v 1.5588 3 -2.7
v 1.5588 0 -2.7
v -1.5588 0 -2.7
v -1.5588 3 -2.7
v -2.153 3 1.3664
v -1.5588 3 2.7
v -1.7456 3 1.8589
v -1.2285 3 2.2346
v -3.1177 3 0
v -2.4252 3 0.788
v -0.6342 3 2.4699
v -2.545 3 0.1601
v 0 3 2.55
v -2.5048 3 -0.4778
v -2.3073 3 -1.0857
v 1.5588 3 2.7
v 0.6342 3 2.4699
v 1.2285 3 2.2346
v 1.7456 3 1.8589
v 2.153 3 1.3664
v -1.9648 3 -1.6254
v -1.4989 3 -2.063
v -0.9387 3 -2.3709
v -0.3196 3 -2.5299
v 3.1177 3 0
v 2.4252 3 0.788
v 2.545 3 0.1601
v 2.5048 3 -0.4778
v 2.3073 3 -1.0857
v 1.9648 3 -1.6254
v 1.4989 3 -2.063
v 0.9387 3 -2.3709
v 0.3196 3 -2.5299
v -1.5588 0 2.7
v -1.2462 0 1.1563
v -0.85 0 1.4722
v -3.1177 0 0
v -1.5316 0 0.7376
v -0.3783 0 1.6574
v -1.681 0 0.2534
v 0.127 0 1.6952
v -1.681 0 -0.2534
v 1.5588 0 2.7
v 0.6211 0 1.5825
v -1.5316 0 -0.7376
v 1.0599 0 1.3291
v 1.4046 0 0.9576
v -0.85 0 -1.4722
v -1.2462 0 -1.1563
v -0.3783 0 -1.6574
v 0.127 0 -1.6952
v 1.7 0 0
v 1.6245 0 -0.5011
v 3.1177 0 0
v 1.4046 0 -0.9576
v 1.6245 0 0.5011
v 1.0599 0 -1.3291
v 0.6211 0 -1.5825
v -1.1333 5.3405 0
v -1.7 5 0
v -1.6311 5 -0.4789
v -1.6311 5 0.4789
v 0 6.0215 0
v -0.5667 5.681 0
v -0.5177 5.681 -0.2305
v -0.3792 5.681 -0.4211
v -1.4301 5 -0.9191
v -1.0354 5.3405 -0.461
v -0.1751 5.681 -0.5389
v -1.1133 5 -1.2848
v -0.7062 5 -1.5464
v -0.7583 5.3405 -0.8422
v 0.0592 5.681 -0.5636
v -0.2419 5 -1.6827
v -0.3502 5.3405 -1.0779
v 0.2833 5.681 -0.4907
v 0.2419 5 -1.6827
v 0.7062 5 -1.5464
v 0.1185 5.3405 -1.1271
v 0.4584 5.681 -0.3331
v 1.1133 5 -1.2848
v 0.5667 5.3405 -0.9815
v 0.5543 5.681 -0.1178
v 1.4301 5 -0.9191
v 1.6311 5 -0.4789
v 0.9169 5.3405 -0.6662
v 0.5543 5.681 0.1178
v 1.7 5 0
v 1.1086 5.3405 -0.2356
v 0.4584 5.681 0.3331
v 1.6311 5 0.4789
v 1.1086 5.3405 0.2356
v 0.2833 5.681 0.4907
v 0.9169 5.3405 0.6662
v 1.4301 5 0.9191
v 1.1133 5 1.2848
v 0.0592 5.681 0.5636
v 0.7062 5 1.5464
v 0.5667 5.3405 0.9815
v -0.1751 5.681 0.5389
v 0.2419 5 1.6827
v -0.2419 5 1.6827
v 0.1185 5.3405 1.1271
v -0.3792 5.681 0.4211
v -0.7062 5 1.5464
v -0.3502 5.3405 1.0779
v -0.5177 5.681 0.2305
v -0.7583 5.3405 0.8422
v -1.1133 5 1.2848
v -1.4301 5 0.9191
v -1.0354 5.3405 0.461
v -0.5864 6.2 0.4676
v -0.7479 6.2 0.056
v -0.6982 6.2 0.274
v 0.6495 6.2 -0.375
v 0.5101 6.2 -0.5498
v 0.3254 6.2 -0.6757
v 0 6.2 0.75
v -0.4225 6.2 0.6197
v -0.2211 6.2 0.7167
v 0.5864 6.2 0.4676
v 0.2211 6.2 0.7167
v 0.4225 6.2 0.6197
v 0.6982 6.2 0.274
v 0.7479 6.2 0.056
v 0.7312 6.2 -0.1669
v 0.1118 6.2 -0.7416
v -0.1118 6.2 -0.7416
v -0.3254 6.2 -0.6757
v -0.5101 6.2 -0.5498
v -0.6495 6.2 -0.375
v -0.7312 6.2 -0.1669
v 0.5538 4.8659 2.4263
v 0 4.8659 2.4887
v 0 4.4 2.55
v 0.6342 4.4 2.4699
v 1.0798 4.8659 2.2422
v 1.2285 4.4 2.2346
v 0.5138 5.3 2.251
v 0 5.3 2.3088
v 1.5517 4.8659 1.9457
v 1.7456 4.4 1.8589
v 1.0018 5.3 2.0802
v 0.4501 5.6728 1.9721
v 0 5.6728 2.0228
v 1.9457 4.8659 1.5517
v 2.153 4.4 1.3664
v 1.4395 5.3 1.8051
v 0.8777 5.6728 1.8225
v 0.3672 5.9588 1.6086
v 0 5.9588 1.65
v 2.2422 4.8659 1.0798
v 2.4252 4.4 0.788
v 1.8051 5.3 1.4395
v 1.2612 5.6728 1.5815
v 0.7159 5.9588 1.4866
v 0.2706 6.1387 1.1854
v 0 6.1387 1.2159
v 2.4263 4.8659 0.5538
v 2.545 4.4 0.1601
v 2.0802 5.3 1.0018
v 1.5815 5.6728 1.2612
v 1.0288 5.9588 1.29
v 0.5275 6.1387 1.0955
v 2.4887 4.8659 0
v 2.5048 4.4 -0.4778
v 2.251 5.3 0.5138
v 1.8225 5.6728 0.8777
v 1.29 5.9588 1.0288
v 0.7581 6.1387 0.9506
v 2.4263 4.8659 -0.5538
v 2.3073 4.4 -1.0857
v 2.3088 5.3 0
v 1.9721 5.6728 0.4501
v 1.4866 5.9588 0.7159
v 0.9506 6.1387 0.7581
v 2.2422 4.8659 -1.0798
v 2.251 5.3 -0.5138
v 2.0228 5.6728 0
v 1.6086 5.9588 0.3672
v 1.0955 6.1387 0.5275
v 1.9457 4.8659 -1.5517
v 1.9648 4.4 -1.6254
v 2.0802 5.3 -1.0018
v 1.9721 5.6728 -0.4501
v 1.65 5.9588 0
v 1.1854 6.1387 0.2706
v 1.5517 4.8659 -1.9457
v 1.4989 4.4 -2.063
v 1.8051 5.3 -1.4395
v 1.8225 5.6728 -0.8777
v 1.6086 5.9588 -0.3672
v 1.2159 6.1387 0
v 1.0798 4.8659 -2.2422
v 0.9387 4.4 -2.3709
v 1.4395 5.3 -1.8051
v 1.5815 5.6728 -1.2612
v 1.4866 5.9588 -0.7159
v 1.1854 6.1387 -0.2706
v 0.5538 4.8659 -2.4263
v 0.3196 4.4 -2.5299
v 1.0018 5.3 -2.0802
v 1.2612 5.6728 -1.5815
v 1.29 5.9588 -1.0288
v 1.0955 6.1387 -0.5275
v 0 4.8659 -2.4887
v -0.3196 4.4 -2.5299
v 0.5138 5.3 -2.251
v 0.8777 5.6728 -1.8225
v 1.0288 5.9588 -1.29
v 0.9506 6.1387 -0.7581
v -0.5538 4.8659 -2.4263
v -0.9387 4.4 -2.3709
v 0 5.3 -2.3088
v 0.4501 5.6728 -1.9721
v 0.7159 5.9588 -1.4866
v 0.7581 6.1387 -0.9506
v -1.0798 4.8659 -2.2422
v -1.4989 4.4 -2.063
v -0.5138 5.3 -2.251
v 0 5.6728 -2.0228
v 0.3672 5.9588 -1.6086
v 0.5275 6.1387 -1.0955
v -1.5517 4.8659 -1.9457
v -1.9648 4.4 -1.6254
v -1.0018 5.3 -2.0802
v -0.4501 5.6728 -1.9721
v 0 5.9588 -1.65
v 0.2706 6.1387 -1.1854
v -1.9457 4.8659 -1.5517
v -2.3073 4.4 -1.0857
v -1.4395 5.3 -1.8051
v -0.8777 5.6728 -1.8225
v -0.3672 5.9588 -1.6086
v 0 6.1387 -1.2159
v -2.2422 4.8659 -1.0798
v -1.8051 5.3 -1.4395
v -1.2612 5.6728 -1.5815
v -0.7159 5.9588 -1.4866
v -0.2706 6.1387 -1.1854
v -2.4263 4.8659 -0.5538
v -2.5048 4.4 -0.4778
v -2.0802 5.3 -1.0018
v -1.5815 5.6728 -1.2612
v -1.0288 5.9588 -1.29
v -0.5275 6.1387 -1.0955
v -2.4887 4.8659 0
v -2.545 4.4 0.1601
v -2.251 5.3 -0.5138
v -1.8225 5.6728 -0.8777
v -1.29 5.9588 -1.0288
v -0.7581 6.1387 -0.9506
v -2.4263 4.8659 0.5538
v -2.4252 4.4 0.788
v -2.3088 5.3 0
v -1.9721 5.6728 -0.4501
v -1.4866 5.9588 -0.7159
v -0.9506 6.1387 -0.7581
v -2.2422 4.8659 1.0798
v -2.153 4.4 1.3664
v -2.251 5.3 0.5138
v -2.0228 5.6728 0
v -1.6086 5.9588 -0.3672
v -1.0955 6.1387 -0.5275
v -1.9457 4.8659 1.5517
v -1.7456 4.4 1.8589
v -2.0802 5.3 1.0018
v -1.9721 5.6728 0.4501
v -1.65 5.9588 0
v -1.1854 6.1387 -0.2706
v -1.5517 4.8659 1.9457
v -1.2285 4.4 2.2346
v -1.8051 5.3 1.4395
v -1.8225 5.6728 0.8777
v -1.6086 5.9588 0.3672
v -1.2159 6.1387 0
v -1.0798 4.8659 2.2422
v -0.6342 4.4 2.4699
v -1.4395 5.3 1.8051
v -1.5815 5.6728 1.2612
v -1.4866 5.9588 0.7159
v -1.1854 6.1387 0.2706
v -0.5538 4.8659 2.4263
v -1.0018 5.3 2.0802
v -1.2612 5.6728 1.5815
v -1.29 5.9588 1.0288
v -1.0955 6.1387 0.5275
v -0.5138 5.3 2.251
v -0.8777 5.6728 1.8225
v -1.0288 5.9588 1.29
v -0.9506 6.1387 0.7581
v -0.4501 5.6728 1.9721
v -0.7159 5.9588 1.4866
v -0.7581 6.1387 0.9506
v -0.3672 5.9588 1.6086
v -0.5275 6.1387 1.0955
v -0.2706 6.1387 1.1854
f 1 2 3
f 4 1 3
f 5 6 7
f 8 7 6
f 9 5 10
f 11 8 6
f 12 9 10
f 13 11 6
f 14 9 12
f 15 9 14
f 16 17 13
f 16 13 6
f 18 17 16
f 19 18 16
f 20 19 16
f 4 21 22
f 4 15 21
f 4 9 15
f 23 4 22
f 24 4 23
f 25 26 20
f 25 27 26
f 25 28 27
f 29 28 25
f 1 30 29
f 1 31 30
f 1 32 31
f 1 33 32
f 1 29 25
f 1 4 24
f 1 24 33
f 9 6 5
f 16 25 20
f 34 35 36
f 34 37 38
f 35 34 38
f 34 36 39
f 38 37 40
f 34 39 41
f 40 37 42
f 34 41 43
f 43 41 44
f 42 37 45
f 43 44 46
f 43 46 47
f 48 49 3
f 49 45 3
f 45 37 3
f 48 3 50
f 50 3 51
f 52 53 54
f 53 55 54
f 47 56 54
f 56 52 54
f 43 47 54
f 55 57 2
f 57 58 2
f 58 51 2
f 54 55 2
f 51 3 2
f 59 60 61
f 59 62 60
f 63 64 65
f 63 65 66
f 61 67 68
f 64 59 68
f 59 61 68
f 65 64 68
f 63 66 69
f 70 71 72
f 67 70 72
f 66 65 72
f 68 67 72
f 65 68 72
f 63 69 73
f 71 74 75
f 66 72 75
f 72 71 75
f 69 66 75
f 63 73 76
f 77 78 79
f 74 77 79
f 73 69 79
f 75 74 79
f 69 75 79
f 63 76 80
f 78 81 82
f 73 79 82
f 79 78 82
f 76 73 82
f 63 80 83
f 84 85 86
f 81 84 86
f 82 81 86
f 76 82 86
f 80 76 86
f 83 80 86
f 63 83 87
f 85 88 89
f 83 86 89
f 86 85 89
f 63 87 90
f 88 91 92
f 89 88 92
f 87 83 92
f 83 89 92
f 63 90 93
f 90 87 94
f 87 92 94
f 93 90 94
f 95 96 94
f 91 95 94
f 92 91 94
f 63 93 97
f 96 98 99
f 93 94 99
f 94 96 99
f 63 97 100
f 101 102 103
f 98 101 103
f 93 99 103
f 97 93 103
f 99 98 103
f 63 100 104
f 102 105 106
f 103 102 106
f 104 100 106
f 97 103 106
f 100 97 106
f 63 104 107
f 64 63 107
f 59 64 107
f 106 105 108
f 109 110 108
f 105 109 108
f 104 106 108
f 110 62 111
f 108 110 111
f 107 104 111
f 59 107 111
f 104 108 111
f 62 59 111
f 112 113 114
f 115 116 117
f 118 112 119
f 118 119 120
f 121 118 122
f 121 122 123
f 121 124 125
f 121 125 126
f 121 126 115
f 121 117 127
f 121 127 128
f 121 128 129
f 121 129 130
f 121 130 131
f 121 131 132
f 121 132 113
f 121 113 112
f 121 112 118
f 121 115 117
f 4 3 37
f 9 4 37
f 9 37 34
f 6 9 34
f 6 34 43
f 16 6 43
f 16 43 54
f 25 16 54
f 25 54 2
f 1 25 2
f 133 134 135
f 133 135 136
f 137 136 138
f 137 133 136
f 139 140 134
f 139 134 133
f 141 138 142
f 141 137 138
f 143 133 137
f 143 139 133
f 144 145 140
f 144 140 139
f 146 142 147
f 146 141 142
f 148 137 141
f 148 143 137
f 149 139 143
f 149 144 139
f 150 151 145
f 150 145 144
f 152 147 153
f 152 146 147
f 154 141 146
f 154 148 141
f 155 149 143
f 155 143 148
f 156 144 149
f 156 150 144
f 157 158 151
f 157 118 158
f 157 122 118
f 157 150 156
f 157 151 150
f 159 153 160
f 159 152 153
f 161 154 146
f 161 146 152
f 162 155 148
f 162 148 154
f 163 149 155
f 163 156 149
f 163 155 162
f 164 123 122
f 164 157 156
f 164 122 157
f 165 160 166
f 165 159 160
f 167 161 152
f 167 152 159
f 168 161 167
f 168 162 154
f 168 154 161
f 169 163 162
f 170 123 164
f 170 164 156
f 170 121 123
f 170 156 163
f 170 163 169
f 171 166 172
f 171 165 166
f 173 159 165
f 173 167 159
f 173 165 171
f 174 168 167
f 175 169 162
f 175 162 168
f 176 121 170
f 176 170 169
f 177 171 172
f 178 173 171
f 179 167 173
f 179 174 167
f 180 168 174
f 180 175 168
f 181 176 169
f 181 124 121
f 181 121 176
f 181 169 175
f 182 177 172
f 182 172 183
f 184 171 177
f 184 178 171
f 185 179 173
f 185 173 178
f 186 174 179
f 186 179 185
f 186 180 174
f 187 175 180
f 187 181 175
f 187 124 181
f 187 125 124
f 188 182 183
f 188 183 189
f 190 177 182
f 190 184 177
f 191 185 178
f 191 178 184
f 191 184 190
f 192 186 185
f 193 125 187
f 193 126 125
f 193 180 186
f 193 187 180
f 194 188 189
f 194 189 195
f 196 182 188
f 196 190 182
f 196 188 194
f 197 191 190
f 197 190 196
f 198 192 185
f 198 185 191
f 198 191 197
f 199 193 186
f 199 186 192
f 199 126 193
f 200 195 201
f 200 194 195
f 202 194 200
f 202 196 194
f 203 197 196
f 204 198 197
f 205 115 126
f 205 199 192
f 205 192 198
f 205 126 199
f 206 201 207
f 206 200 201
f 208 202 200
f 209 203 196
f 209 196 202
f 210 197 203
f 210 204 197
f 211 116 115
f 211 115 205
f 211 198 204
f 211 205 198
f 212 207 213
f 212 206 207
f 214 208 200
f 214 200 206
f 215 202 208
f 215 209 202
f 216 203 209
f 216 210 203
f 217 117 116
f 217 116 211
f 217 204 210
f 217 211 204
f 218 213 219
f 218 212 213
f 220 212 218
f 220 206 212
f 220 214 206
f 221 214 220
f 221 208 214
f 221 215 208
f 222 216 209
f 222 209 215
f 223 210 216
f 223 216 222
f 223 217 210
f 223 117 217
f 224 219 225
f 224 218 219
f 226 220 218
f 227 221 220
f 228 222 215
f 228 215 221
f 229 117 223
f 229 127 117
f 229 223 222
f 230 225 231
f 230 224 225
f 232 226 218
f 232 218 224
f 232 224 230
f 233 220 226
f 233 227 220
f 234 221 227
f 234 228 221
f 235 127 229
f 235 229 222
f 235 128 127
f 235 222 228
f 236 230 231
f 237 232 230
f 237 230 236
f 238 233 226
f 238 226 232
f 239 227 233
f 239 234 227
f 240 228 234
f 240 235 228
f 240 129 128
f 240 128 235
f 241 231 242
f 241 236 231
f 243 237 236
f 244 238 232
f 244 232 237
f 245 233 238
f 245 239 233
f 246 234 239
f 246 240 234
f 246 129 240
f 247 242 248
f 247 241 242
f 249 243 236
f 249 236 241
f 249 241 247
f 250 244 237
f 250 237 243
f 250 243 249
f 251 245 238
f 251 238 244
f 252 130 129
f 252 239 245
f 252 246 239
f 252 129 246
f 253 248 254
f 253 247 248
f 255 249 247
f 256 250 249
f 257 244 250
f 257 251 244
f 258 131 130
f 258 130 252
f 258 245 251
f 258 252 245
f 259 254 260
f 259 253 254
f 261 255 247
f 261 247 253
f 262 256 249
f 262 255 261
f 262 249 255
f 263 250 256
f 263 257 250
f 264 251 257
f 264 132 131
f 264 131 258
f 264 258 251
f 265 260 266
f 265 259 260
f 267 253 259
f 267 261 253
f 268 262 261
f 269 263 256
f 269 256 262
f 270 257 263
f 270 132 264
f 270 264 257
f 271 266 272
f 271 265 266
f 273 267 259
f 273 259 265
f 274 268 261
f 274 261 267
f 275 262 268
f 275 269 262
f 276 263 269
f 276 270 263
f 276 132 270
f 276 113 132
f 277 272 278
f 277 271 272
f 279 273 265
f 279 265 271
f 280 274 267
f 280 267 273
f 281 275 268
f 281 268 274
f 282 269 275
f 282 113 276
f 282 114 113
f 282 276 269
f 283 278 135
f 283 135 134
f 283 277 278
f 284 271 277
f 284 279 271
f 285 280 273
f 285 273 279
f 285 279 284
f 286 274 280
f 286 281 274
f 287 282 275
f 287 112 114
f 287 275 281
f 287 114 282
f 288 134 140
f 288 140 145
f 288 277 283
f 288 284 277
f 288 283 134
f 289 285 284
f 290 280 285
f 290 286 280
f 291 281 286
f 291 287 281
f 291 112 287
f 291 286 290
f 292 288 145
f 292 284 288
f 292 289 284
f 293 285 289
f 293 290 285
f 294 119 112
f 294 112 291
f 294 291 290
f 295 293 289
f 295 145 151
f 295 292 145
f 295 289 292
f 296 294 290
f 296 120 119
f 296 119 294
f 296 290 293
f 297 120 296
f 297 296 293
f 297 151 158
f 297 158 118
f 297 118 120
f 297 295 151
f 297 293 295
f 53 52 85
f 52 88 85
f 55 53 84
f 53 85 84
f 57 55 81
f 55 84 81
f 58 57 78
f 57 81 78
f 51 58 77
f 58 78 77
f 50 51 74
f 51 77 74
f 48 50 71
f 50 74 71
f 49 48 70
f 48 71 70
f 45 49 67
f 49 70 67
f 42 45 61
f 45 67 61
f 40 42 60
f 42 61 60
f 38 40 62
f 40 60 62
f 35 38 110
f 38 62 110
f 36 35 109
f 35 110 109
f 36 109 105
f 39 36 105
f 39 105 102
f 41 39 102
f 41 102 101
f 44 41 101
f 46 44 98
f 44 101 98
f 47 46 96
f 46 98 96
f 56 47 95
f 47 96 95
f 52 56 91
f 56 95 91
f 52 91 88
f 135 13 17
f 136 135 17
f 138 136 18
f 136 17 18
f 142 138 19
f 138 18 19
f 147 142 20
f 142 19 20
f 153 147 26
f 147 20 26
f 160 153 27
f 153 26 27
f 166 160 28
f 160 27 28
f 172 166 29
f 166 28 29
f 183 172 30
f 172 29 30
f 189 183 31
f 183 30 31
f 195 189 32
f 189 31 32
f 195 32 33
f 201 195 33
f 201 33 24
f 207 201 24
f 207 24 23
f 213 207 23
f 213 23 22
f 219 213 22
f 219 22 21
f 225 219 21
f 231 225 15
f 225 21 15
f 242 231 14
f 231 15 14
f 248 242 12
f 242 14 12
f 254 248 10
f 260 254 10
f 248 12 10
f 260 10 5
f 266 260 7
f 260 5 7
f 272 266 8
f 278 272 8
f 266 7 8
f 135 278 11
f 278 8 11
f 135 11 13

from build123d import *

# Parameters (mm, degrees)
BOSS_EXTRU_1_DEPTH   = 3
ESQUISSE2_R          = 2.55
BOSS_EXTRU_2_DEPTH   = 3.2
CONG_1_R             = 1.8
D_GAGEMENT_M31_D     = 3.4
D_GAGEMENT_M31_DEPTH = 5
D_GAGEMENT_M31_TIP   = 1.021463052


with BuildPart() as part:
    # Esquisse1 → Boss.-Extru.1 (new body)
    with BuildSketch(Plane(origin=(0, 0, 0), x_dir=(1, 0, 0), z_dir=(0, 1, 0))):
        Polygon((3.117691454, 0), (1.558845727, 2.7), (-1.558845727, 2.7), (-3.117691454, 0), (-1.558845727, -2.7), (1.558845727, -2.7), align=None)
    extrude(amount=BOSS_EXTRU_1_DEPTH)

    # Esquisse2 → Boss.-Extru.2 (add)
    with BuildSketch(Plane(origin=(0, 3, 0), x_dir=(1, 0, 0), z_dir=(0, 1, 0))):
        with Locations(Location((0, 0, 0), (0, 0, 270))):
            Circle(ESQUISSE2_R)
    extrude(amount=BOSS_EXTRU_2_DEPTH)

    # Congé1
    cong_1_edges = [part.edges().sort_by_distance(p)[0] for p in [
        (0, 6.2, -2.55),
    ]]
    fillet(cong_1_edges, radius=CONG_1_R)

    # Dégagement M31
    with Locations(Plane(origin=(0, 0, 0), x_dir=(-1, 0, 0), z_dir=(0, -1, 0))):
        with Locations((0, 0)):
            Hole(D_GAGEMENT_M31_D / 2, depth=D_GAGEMENT_M31_DEPTH)
            with Locations((0, 0, -(D_GAGEMENT_M31_DEPTH + D_GAGEMENT_M31_TIP / 2))):  # 118° drill point
                Cone(0, D_GAGEMENT_M31_D / 2, D_GAGEMENT_M31_TIP, mode=Mode.SUBTRACT)


solid = part.part
